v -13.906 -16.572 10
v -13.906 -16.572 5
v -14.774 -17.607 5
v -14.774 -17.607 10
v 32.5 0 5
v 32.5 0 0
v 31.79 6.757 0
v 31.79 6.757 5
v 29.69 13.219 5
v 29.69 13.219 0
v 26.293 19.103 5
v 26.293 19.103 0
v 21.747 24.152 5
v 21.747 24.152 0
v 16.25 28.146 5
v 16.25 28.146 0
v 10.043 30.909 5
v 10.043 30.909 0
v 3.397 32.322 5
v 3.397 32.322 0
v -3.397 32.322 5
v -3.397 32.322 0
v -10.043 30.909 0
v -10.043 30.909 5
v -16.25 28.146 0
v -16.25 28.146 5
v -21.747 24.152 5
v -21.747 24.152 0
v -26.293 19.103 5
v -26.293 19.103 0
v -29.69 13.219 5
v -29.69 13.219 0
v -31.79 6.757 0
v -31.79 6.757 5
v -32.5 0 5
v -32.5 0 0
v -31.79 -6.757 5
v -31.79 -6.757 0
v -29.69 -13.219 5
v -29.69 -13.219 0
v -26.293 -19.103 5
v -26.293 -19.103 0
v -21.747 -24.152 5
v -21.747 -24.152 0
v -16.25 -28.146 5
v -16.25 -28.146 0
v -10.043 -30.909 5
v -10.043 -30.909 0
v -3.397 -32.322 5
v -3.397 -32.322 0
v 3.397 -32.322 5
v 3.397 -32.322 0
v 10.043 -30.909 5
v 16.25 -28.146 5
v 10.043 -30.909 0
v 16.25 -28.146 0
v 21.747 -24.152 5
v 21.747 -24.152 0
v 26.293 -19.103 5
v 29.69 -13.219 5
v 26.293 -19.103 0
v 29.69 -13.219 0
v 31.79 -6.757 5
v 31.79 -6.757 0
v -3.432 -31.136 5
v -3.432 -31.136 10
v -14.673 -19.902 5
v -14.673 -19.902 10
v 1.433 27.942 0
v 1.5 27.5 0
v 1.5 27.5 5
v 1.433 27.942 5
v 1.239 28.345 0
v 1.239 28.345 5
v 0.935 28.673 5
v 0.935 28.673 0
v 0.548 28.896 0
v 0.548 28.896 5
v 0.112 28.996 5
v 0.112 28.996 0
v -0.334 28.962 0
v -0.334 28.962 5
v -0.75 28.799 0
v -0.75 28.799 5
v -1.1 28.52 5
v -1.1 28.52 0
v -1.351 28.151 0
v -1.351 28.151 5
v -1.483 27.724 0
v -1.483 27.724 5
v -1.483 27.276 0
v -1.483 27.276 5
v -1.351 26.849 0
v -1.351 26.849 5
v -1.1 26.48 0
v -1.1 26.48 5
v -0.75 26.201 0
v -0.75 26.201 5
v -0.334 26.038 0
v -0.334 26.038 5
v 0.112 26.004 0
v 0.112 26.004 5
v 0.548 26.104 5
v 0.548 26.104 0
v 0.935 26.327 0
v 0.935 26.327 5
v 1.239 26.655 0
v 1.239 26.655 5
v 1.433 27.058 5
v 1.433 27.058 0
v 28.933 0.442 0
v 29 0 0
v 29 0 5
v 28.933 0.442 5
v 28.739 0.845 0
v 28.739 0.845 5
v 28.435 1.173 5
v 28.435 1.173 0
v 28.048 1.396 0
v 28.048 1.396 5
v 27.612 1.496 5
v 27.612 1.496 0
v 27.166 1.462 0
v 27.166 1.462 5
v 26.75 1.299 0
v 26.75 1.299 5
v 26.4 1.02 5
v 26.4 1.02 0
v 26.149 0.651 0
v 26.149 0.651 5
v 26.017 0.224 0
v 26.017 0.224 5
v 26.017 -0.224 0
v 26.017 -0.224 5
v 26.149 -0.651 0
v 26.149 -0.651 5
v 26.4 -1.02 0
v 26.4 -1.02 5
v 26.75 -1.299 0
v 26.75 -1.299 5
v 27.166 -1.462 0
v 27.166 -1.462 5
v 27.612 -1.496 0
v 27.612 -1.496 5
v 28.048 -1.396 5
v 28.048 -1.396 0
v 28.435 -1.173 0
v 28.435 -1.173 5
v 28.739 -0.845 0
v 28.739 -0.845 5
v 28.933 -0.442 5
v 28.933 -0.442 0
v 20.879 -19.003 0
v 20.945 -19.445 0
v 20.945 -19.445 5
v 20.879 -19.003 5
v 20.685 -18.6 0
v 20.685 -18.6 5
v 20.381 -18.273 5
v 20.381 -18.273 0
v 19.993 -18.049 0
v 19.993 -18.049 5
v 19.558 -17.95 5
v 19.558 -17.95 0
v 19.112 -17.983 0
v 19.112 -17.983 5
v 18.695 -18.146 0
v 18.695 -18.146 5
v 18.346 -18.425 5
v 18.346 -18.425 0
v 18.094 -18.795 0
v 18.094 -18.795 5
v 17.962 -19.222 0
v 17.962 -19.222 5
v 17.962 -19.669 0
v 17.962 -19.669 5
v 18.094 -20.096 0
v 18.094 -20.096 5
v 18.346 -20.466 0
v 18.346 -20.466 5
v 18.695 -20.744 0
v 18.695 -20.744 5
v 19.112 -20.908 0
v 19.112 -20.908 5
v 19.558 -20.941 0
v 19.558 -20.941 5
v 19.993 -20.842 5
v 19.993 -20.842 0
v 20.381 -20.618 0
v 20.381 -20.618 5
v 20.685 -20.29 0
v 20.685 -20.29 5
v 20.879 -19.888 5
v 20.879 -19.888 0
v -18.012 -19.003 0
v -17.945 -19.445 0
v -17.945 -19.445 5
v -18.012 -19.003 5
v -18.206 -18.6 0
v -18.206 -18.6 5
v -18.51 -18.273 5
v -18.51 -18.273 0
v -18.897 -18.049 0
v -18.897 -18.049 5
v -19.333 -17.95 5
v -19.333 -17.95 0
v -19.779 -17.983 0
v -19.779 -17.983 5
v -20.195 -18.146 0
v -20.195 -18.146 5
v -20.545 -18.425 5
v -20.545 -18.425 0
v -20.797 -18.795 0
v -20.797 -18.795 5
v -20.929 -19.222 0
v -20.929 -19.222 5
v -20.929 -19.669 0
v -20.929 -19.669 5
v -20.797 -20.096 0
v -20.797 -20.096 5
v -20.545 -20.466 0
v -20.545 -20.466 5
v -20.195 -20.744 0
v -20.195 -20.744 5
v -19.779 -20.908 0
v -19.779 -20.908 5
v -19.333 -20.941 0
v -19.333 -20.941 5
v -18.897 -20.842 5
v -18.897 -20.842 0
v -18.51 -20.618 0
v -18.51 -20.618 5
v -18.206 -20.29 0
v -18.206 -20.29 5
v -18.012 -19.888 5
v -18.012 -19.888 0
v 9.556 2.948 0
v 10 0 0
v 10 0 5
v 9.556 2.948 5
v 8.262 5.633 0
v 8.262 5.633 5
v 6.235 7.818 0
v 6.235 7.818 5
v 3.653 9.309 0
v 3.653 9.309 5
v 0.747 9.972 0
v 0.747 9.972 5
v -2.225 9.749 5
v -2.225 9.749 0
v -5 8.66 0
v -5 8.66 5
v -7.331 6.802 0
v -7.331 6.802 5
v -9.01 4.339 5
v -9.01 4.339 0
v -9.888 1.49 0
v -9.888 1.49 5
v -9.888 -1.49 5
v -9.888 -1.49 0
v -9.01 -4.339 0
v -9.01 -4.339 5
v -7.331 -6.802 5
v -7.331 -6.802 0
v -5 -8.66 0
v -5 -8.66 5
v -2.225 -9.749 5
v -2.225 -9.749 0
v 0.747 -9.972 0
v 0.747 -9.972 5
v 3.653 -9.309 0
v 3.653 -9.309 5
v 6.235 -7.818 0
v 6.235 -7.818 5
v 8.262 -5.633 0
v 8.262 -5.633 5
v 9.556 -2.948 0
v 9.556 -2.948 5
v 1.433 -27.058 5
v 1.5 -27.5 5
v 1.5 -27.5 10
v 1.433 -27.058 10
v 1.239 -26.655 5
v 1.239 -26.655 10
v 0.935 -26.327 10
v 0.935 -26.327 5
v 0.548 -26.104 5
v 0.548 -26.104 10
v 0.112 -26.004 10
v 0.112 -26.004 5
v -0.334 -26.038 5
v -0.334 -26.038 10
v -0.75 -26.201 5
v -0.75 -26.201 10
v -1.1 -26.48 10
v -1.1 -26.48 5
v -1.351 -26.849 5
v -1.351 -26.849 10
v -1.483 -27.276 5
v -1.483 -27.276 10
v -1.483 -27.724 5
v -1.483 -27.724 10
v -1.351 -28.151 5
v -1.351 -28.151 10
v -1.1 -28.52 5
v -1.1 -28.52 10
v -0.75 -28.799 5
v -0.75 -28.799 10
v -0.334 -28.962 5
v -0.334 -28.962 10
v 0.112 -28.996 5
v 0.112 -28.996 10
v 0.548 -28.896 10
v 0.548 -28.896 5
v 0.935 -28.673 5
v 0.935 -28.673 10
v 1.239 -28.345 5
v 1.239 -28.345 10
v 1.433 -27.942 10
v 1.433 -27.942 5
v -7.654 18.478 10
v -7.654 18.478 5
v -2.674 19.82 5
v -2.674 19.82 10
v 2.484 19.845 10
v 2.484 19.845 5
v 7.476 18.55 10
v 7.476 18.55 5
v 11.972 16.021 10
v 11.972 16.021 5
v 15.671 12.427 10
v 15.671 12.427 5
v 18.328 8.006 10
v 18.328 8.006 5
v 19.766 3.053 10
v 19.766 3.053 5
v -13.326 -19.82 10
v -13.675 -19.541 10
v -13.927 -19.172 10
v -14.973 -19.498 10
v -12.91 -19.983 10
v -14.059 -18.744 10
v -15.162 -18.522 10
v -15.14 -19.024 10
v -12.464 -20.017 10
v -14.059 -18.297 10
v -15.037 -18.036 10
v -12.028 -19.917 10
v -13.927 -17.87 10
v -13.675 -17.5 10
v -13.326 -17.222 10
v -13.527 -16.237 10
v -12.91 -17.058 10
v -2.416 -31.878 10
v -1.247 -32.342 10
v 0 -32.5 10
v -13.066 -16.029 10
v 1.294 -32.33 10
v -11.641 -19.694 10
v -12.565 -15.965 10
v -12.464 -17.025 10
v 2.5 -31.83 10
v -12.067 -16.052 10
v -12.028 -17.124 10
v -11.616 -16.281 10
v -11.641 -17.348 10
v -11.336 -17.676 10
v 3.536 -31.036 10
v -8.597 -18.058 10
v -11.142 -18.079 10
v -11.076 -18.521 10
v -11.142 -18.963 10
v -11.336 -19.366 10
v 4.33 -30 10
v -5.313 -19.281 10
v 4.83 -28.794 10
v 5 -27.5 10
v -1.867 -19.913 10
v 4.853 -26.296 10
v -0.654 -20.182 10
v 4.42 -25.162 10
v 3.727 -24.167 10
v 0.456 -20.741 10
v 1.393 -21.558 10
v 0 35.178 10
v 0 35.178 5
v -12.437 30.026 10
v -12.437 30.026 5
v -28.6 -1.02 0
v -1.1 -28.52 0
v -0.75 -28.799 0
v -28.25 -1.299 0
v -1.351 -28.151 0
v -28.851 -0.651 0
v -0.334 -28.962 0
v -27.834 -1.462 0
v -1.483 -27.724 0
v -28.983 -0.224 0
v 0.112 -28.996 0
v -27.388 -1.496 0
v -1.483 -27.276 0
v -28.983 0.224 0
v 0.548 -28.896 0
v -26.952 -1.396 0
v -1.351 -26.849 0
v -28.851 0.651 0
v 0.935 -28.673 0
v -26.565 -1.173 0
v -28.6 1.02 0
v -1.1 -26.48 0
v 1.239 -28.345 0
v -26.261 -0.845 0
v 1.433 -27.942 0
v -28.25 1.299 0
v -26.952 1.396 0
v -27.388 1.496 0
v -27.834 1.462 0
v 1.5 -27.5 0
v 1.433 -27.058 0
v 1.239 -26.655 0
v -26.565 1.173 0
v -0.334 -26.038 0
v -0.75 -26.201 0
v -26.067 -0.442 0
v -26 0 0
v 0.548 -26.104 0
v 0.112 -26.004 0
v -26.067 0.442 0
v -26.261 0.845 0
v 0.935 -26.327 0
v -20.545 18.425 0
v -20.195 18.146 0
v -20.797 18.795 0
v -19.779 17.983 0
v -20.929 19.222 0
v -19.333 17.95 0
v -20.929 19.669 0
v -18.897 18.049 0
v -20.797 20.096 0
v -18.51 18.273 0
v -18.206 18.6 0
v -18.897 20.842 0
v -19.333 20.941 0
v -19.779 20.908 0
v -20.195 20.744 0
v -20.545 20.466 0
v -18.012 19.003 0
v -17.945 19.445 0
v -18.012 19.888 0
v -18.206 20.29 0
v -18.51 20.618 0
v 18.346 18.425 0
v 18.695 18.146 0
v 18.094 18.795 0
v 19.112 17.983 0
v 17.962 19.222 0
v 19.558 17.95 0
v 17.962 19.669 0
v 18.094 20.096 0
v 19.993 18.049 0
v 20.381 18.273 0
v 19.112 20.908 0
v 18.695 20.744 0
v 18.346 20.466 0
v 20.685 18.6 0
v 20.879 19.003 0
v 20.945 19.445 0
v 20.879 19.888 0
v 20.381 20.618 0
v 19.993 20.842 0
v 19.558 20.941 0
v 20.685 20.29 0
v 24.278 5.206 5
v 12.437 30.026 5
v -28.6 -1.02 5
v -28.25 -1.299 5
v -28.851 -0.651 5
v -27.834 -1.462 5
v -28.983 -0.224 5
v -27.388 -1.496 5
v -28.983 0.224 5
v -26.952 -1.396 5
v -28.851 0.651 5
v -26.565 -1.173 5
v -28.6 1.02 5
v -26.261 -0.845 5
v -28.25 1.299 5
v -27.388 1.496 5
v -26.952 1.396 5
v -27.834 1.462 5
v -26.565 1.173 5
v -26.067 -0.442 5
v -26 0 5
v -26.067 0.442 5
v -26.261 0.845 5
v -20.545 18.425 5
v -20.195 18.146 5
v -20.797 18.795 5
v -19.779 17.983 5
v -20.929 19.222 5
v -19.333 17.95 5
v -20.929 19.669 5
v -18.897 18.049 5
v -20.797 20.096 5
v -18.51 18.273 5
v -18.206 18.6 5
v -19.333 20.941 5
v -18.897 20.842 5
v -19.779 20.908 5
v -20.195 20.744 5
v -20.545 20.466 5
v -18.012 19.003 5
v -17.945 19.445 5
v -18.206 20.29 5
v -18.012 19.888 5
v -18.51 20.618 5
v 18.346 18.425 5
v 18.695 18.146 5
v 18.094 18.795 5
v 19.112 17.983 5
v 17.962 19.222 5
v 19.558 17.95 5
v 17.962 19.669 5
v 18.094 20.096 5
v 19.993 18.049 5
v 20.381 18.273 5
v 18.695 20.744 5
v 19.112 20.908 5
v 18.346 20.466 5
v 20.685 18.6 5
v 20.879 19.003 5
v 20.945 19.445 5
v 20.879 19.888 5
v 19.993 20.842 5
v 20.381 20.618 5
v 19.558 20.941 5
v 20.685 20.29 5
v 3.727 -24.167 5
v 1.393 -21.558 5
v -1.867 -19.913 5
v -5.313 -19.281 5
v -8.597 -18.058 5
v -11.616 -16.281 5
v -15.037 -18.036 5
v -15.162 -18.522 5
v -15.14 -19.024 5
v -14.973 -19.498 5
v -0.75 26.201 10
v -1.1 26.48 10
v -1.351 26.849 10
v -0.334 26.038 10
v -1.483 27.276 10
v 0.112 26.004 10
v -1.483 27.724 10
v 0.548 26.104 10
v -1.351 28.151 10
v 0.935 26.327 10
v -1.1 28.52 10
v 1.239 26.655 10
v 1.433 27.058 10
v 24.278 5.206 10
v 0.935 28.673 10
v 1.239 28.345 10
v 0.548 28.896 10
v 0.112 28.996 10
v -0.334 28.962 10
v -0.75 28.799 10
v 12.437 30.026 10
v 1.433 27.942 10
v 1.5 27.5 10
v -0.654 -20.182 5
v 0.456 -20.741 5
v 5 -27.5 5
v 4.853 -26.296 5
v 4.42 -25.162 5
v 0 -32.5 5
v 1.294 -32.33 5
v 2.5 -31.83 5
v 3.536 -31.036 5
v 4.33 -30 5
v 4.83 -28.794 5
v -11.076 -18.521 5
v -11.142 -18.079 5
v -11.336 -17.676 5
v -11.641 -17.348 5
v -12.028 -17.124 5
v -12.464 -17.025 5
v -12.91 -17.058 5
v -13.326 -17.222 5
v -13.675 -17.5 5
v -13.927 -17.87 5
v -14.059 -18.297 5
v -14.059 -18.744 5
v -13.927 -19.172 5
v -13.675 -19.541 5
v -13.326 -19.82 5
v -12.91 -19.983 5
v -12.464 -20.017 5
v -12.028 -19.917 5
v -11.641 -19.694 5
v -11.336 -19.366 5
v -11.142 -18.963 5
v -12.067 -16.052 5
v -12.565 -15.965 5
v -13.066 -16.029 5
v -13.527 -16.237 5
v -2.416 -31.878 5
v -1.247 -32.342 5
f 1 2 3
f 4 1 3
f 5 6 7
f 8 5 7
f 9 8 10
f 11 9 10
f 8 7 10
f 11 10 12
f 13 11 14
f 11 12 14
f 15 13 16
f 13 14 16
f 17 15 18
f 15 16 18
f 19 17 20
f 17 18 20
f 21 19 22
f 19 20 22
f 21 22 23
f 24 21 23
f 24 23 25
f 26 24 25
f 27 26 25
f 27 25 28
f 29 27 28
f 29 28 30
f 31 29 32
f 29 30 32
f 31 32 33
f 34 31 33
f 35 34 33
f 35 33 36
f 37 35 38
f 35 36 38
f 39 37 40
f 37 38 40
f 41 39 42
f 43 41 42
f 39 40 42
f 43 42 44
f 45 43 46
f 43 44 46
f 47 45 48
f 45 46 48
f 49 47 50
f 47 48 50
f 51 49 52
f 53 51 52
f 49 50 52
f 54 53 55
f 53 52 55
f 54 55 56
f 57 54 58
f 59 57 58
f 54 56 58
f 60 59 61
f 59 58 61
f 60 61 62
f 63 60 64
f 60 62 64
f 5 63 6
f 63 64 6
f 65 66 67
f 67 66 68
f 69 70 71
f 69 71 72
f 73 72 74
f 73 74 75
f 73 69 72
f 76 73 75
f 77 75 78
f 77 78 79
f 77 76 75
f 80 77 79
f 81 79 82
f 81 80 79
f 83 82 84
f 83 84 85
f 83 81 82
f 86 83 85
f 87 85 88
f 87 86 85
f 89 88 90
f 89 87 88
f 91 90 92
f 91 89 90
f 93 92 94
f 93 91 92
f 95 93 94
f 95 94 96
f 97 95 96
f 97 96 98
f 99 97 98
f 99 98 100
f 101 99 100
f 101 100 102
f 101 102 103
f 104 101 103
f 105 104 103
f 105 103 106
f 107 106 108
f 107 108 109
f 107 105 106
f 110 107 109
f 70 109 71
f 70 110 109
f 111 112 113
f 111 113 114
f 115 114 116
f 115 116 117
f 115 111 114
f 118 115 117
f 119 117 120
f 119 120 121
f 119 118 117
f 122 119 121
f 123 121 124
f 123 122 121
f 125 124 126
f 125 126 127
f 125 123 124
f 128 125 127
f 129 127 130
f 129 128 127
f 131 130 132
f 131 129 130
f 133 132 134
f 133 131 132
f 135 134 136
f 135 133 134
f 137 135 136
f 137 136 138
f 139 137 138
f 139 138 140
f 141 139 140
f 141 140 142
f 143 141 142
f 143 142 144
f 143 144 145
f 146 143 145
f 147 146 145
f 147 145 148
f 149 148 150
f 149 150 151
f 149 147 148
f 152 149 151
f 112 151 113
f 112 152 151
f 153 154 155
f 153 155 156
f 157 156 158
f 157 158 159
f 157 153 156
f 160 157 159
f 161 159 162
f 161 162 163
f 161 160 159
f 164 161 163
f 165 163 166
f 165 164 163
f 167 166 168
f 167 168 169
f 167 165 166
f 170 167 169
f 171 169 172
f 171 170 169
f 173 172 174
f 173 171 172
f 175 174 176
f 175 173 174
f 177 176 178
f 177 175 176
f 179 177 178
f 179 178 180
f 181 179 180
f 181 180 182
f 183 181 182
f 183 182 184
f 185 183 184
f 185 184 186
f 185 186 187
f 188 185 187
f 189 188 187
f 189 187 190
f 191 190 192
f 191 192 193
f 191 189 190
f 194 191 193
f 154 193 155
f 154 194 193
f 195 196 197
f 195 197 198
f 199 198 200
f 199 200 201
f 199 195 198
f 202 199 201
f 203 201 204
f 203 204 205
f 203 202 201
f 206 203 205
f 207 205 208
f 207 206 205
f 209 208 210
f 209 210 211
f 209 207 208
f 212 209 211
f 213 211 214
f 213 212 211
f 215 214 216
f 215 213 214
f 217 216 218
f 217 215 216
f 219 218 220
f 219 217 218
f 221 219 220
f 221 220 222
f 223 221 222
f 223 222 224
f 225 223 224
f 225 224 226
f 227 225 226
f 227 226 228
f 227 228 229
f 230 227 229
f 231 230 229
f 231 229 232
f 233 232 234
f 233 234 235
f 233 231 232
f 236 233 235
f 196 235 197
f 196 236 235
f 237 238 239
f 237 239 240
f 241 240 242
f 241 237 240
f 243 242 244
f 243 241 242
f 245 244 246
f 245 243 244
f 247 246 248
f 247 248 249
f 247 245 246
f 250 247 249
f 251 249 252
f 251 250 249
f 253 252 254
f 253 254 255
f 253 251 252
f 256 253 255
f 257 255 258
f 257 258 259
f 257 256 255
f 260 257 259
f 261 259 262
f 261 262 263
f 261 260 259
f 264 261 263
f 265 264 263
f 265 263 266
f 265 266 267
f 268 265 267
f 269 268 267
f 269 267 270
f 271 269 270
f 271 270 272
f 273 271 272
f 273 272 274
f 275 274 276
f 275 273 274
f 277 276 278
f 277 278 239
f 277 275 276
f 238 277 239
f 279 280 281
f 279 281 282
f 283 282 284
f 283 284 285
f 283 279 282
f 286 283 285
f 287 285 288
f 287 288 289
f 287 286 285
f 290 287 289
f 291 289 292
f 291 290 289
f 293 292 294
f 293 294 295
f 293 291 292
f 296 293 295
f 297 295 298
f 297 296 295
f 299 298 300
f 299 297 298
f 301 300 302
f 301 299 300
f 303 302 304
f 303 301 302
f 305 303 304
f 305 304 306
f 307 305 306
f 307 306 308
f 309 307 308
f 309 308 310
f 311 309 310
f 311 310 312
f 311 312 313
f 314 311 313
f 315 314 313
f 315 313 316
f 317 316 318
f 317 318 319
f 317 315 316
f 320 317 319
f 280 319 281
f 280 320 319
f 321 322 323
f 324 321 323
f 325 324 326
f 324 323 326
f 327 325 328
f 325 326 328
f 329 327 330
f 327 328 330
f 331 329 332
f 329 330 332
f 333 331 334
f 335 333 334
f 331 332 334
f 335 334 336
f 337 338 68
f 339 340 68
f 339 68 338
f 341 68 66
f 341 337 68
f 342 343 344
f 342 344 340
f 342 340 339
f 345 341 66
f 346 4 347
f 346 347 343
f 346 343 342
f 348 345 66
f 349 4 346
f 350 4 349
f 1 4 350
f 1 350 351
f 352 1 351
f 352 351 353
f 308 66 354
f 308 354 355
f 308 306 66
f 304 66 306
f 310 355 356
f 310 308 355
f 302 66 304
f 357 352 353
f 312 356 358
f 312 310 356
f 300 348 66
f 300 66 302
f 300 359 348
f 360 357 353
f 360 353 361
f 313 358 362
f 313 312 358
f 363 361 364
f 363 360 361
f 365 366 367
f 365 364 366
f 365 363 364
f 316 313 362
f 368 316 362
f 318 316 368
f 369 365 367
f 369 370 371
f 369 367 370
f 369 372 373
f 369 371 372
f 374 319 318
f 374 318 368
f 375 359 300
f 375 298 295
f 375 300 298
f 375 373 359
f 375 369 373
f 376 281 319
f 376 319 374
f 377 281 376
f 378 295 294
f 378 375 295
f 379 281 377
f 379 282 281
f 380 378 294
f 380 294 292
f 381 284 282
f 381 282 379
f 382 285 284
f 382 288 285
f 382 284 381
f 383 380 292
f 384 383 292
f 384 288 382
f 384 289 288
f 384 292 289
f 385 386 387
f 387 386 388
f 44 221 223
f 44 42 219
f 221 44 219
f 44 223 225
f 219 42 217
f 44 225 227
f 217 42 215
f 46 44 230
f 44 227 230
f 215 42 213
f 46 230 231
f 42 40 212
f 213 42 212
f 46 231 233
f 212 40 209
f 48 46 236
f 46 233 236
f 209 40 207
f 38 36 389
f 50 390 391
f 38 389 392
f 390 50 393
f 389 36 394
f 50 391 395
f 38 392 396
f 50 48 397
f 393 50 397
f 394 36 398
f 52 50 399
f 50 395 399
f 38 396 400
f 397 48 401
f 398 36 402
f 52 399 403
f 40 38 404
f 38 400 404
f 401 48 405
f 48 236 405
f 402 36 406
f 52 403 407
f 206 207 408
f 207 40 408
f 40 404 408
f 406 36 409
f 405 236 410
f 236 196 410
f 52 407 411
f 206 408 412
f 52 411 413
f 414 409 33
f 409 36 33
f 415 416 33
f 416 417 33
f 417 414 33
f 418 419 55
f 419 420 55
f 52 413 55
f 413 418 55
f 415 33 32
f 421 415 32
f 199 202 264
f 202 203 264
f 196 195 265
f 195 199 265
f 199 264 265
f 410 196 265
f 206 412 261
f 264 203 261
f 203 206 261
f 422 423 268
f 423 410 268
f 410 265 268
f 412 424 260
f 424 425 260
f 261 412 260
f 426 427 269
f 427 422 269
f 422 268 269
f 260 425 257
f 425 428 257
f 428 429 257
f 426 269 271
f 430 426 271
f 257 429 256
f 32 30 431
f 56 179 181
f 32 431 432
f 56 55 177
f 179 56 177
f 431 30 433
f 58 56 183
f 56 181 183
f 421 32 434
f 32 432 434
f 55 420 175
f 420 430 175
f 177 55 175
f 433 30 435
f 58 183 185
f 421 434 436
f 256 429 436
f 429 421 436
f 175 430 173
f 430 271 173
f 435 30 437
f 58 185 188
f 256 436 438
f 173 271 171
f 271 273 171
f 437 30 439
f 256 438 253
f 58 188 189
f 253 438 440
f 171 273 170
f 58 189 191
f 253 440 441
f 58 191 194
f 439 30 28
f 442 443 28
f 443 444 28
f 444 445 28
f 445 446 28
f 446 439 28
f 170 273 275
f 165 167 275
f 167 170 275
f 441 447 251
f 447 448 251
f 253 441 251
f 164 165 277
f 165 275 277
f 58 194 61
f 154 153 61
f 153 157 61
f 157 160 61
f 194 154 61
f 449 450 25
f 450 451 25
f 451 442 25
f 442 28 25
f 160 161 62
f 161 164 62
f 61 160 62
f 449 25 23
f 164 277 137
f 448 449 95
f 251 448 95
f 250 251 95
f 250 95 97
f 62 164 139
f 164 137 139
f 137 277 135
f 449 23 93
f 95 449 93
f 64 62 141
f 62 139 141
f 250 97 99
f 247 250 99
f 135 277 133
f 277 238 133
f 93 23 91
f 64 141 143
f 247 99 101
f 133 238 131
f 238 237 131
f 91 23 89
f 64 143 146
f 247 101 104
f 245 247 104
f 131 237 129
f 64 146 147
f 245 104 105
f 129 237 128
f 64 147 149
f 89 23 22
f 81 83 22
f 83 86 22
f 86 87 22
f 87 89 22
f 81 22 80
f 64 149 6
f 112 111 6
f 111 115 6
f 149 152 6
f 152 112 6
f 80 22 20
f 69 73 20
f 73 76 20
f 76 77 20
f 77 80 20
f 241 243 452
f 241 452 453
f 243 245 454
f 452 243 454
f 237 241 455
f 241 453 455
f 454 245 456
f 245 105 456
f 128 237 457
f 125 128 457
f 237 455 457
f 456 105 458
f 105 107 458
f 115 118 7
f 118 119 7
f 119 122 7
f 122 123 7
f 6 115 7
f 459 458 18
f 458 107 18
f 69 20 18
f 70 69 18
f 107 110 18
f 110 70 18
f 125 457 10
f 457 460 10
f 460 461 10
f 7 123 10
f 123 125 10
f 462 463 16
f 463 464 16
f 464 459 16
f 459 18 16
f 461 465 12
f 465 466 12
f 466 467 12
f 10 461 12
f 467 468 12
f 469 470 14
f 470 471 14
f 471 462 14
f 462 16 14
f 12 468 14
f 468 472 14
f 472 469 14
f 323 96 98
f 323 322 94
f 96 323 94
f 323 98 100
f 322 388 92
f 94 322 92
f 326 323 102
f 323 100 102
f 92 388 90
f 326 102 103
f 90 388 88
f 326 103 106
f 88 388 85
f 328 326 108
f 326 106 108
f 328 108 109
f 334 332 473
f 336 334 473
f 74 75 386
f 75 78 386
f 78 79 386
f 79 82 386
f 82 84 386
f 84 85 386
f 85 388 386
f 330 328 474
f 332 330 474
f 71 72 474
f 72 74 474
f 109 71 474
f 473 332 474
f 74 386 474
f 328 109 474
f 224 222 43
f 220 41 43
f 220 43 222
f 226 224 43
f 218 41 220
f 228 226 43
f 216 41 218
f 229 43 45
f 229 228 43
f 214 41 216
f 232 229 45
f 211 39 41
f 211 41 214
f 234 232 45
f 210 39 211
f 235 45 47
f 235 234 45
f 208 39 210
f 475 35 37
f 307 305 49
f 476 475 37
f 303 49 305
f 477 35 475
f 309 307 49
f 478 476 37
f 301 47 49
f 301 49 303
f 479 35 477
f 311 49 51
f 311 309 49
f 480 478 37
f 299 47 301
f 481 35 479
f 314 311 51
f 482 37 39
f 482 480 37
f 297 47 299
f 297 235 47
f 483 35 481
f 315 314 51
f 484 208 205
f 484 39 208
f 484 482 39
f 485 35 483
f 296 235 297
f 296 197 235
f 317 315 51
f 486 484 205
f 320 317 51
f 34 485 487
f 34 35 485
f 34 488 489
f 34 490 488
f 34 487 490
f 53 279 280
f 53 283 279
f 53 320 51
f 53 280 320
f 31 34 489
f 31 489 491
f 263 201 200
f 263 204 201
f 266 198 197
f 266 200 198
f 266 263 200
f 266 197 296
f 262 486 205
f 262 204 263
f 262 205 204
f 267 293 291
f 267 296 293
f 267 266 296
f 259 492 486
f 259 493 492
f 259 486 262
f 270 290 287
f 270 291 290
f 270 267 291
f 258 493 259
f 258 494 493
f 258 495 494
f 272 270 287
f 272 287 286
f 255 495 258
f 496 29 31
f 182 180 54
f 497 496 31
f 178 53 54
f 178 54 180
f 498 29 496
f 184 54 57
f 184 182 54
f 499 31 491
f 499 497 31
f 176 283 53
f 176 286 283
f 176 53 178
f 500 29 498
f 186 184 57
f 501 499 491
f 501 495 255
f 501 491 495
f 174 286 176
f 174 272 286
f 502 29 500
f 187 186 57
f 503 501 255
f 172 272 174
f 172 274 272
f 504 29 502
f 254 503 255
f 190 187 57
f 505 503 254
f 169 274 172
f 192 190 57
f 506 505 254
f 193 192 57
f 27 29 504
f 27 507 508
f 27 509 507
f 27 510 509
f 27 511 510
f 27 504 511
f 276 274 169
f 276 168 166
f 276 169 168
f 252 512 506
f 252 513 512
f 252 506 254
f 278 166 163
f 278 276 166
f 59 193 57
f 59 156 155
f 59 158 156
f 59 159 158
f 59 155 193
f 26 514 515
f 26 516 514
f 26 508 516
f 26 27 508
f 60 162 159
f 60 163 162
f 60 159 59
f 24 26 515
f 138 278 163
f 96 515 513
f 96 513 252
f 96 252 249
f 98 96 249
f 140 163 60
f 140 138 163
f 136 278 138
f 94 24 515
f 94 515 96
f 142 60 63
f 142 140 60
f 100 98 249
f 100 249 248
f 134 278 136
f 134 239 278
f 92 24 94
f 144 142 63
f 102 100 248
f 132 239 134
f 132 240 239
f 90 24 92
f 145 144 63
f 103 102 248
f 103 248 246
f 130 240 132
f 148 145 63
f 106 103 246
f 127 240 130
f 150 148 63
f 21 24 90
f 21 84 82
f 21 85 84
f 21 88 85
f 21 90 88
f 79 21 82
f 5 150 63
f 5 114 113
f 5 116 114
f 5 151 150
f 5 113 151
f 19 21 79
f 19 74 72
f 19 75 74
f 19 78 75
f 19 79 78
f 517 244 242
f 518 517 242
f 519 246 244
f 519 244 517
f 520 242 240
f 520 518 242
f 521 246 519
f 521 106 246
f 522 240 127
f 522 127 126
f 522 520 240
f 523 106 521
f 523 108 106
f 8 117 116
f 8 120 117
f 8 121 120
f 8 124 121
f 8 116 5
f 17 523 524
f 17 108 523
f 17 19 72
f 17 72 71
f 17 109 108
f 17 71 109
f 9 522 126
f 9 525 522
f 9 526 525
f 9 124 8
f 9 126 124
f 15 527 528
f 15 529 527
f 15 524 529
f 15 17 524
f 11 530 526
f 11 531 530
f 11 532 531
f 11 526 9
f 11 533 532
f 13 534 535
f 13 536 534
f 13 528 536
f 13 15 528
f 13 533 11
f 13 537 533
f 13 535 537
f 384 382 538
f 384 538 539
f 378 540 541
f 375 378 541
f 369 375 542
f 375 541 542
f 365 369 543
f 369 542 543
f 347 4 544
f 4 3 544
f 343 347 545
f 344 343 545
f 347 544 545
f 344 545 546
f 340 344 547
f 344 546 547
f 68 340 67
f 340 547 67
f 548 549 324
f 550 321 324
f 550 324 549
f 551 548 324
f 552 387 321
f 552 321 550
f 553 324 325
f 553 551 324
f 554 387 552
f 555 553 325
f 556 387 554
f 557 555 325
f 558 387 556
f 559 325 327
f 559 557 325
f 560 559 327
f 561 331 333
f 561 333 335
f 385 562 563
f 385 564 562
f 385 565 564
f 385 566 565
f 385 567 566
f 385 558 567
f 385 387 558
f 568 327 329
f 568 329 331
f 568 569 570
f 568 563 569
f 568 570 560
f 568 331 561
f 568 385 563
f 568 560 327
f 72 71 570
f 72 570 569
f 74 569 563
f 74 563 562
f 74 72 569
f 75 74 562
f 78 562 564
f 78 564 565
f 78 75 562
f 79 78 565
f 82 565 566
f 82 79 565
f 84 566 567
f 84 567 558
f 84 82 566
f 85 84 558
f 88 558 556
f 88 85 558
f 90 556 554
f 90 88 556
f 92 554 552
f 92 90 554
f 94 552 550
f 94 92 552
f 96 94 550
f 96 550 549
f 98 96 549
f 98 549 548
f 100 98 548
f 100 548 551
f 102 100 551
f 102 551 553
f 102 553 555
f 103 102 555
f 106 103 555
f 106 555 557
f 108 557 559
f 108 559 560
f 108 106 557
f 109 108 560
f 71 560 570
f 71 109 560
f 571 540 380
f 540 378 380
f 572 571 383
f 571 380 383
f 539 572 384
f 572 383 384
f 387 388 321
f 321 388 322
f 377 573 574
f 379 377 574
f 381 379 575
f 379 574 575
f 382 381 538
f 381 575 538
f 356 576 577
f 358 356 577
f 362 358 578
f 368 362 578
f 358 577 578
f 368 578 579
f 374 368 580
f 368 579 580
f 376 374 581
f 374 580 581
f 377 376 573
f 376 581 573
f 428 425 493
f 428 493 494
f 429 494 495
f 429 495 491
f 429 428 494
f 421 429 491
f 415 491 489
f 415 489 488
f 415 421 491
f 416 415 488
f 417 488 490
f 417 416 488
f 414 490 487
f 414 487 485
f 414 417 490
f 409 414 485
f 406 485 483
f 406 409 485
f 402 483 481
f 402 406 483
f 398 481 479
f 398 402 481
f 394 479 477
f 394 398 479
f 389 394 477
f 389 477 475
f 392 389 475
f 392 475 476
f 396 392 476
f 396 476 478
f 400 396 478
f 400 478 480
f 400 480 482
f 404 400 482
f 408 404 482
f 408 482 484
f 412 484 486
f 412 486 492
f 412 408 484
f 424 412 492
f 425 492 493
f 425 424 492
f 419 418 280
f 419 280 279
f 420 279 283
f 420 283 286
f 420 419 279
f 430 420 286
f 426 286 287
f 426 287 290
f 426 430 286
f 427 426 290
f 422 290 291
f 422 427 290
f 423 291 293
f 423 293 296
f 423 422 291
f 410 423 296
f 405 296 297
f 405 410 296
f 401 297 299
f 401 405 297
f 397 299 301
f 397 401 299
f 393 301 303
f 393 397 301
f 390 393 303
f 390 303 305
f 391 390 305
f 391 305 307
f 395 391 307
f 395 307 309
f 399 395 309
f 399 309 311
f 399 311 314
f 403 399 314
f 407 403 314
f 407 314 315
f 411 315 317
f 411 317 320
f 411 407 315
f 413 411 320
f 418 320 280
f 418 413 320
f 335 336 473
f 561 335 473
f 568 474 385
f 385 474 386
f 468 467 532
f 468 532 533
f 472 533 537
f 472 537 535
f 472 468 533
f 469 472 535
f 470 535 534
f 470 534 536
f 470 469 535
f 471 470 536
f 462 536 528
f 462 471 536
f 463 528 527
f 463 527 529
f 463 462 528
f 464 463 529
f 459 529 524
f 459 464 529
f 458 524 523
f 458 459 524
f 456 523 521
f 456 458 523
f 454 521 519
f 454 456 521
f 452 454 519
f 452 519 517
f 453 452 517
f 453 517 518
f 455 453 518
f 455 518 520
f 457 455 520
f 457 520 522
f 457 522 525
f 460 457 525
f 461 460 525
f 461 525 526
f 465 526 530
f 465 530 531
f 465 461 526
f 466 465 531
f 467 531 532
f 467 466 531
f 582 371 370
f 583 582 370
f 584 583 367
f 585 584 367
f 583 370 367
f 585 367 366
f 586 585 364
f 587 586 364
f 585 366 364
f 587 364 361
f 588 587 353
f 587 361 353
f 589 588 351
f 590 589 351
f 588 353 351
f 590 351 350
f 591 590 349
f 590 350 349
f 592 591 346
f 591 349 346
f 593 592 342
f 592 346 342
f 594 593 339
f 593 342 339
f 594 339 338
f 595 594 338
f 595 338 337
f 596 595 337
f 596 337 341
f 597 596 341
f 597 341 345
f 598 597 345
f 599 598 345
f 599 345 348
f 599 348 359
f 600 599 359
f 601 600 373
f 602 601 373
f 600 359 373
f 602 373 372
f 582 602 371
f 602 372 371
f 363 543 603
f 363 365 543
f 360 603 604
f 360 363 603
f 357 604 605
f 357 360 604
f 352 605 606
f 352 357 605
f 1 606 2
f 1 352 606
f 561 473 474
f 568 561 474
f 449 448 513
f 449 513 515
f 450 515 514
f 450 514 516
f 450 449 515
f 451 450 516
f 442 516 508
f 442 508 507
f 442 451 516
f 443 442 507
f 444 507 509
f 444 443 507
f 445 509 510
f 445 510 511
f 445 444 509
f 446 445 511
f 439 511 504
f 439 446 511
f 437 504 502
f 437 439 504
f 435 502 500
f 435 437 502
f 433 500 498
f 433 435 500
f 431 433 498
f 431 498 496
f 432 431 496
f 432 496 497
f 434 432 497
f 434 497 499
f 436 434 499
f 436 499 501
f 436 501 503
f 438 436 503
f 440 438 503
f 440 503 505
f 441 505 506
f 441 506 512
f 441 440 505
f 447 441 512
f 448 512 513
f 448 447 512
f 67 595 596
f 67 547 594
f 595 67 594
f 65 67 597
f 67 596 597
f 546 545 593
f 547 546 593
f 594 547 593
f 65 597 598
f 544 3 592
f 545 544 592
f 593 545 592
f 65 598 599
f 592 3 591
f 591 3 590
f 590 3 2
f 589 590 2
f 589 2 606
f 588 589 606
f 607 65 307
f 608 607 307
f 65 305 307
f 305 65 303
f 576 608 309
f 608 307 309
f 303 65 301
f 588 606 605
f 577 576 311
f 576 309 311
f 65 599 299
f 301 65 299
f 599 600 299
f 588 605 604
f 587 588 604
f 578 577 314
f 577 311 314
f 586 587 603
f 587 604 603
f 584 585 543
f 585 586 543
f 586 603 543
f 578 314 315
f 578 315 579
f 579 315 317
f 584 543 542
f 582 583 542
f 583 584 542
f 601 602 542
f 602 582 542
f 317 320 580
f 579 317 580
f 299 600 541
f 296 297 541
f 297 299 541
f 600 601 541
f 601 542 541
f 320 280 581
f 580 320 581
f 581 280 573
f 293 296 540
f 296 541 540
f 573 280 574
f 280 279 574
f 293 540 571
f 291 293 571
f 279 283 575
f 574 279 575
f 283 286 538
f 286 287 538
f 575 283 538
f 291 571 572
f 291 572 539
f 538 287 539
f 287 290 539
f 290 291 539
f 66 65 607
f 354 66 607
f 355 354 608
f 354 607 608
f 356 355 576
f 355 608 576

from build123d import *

# Parameters (mm, degrees)
F0_R     = 32.5
F0_R_2   = 1.5
F0_R_3   = 10
F1_DEPTH = 5
F2_R     = 1.5
F3_DEPTH = 5
F4_R     = 1.5
F5_DEPTH = 5
F6_R     = 1.7
F7_R     = 5


# Not quite as in the source:
# - a feature names something its author has since deleted; it is built from what else it names


with BuildPart() as f1:
    # F0 (on Top) → F1 (new body)
    with BuildSketch(Plane.XY):
        Circle(F0_R)
        with Locations((-19.4454364826, -19.4454364826)):
            Circle(F0_R_2, mode=Mode.SUBTRACT)
        with Locations((0, -27.5)):
            Circle(F0_R_2, mode=Mode.SUBTRACT)
        with Locations((19.4454364826, -19.4454364826)):
            Circle(F0_R_2, mode=Mode.SUBTRACT)
        with Locations((-27.5, 0)):
            Circle(F0_R_2, mode=Mode.SUBTRACT)
        with Locations((-19.4454364826, 19.4454364826)):
            Circle(F0_R_2, mode=Mode.SUBTRACT)
        Circle(F0_R_3, mode=Mode.SUBTRACT)
        with Locations((27.5, 0)):
            Circle(F0_R_2, mode=Mode.SUBTRACT)
        with Locations((0, 27.5)):
            Circle(F0_R_2, mode=Mode.SUBTRACT)
        with Locations((19.4454364826, 19.4454364826)):
            Circle(F0_R_2, mode=Mode.SUBTRACT)
    extrude(amount=F1_DEPTH)


with BuildPart() as f3:
    # F2 (on face) → F3 (new body)
    with BuildSketch(Plane.XY.offset(5)):
        with BuildLine():
            Line((12.4372115519, 30.0260848066), (0, 35.1777465095))
            Line((0, 35.1777465095), (-12.4372115519, 30.0260848066))
            ThreePointArc((-12.4372115519, 30.0260848066), (0, 32.5), (12.4372115519, 30.0260848066))
        make_face()
        with BuildLine():
            Line((24.2783450797, 5.2059809233), (12.4372115519, 30.0260848066))
            ThreePointArc((12.4372115519, 30.0260848066), (0, 32.5), (-12.4372115519, 30.0260848066))
            Line((-12.4372115519, 30.0260848066), (-7.6536686473, 18.4775906502))
            ThreePointArc((-7.6536686473, 18.4775906502), (9.8058067569, 17.4311833748), (19.7655989191, 3.0530475546))
            Line((19.7655989191, 3.0530475546), (24.2783450797, 5.2059809233))
        make_face()
        with Locations((0, 27.5)):
            Circle(F2_R, mode=Mode.SUBTRACT)
    extrude(amount=F3_DEPTH)


with BuildPart() as f3b:
    # F2 (on face) → F3, piece 2 (new body)
    with BuildSketch(Plane.XY.offset(5)):
        with BuildLine():
            ThreePointArc((0, -20), (-6.8404028665, -18.7938524157), (-12.8557521937, -15.3208888624))
            Line((-12.8557521937, -15.3208888624), (-16.0696902422, -19.151111078))
            ThreePointArc((-16.0696902422, -19.151111078), (-10.4611183934, -22.7060565039), (-4.1145152251, -24.6590909091))
            ThreePointArc((-4.1145152251, -24.6590909091), (-2.3233009432, -23.0725546048), (0, -22.5))
            Line((0, -22.5), (0, -20))
        make_face()
        with BuildLine():
            Line((3.7267799625, -24.1666666667), (0, -20))
            Line((0, -20), (0, -22.5))
            ThreePointArc((0, -22.5), (2.0412414523, -22.9356453541), (3.7267799625, -24.1666666667))
        make_face()
        with BuildLine():
            ThreePointArc((-4.1145152251, -24.6590909091), (-10.4611183934, -22.7060565039), (-16.0696902422, -19.151111078))
            Line((-16.0696902422, -19.151111078), (-16.0970617223, -19.1837311378))
            Line((-16.0970617223, -19.1837311378), (-3.4317429251, -31.1363636364))
            ThreePointArc((-3.4317429251, -31.1363636364), (-4.9724509563, -28.0241483443), (-4.1145152251, -24.6590909091))
        make_face()
        with BuildLine():
            ThreePointArc((3.7267799625, -24.1666666667), (2.0412414523, -22.9356453541), (0, -22.5))
            ThreePointArc((0, -22.5), (-2.3233009432, -23.0725546048), (-4.1145152251, -24.6590909091))
            ThreePointArc((-4.1145152251, -24.6590909091), (-4.9724509563, -28.0241483443), (-3.4317429251, -31.1363636364))
            ThreePointArc((-3.4317429251, -31.1363636364), (-1.8463723838, -32.1466018788), (-4.12e-08, -32.5))
            ThreePointArc((-4.12e-08, -32.5), (3.5355338914, -31.0355339205), (5, -27.5))
            ThreePointArc((5, -27.5), (4.6708617948, -25.7158895511), (3.7267799625, -24.1666666667))
        make_face()
        with Locations((0, -27.5)):
            Circle(F2_R, mode=Mode.SUBTRACT)
    extrude(amount=F3_DEPTH)

    # F4 (on face) → F5 (cut, through all)
    with BuildSketch(Plane.XY.offset(10)):
        Polygon((-3.4317429251, -31.1363636364), (-15.7756679175, -18.8007089162), (-16.0970617223, -19.1837311378), align=None)
        with Locations((-12.5758000287, -18.5207567512)):
            Circle(F4_R)
    extrude(amount=-F5_DEPTH, mode=Mode.SUBTRACT)

    # F6
    f6_edges = [f3b.edges().sort_by_distance(p)[0] for p in [
        (-15.775668, -18.800709, 7.5),
        (-12.855752, -15.320889, 7.5),
    ]]
    fillet(f6_edges, radius=F6_R)

    # F7
    f7_edges = [f3b.edges().sort_by_distance(p)[0] for p in [
        (0, -20, 7.5),
    ]]
    fillet(f7_edges, radius=F7_R)


solid = Compound([f1.part, f3.part, f3b.part])
